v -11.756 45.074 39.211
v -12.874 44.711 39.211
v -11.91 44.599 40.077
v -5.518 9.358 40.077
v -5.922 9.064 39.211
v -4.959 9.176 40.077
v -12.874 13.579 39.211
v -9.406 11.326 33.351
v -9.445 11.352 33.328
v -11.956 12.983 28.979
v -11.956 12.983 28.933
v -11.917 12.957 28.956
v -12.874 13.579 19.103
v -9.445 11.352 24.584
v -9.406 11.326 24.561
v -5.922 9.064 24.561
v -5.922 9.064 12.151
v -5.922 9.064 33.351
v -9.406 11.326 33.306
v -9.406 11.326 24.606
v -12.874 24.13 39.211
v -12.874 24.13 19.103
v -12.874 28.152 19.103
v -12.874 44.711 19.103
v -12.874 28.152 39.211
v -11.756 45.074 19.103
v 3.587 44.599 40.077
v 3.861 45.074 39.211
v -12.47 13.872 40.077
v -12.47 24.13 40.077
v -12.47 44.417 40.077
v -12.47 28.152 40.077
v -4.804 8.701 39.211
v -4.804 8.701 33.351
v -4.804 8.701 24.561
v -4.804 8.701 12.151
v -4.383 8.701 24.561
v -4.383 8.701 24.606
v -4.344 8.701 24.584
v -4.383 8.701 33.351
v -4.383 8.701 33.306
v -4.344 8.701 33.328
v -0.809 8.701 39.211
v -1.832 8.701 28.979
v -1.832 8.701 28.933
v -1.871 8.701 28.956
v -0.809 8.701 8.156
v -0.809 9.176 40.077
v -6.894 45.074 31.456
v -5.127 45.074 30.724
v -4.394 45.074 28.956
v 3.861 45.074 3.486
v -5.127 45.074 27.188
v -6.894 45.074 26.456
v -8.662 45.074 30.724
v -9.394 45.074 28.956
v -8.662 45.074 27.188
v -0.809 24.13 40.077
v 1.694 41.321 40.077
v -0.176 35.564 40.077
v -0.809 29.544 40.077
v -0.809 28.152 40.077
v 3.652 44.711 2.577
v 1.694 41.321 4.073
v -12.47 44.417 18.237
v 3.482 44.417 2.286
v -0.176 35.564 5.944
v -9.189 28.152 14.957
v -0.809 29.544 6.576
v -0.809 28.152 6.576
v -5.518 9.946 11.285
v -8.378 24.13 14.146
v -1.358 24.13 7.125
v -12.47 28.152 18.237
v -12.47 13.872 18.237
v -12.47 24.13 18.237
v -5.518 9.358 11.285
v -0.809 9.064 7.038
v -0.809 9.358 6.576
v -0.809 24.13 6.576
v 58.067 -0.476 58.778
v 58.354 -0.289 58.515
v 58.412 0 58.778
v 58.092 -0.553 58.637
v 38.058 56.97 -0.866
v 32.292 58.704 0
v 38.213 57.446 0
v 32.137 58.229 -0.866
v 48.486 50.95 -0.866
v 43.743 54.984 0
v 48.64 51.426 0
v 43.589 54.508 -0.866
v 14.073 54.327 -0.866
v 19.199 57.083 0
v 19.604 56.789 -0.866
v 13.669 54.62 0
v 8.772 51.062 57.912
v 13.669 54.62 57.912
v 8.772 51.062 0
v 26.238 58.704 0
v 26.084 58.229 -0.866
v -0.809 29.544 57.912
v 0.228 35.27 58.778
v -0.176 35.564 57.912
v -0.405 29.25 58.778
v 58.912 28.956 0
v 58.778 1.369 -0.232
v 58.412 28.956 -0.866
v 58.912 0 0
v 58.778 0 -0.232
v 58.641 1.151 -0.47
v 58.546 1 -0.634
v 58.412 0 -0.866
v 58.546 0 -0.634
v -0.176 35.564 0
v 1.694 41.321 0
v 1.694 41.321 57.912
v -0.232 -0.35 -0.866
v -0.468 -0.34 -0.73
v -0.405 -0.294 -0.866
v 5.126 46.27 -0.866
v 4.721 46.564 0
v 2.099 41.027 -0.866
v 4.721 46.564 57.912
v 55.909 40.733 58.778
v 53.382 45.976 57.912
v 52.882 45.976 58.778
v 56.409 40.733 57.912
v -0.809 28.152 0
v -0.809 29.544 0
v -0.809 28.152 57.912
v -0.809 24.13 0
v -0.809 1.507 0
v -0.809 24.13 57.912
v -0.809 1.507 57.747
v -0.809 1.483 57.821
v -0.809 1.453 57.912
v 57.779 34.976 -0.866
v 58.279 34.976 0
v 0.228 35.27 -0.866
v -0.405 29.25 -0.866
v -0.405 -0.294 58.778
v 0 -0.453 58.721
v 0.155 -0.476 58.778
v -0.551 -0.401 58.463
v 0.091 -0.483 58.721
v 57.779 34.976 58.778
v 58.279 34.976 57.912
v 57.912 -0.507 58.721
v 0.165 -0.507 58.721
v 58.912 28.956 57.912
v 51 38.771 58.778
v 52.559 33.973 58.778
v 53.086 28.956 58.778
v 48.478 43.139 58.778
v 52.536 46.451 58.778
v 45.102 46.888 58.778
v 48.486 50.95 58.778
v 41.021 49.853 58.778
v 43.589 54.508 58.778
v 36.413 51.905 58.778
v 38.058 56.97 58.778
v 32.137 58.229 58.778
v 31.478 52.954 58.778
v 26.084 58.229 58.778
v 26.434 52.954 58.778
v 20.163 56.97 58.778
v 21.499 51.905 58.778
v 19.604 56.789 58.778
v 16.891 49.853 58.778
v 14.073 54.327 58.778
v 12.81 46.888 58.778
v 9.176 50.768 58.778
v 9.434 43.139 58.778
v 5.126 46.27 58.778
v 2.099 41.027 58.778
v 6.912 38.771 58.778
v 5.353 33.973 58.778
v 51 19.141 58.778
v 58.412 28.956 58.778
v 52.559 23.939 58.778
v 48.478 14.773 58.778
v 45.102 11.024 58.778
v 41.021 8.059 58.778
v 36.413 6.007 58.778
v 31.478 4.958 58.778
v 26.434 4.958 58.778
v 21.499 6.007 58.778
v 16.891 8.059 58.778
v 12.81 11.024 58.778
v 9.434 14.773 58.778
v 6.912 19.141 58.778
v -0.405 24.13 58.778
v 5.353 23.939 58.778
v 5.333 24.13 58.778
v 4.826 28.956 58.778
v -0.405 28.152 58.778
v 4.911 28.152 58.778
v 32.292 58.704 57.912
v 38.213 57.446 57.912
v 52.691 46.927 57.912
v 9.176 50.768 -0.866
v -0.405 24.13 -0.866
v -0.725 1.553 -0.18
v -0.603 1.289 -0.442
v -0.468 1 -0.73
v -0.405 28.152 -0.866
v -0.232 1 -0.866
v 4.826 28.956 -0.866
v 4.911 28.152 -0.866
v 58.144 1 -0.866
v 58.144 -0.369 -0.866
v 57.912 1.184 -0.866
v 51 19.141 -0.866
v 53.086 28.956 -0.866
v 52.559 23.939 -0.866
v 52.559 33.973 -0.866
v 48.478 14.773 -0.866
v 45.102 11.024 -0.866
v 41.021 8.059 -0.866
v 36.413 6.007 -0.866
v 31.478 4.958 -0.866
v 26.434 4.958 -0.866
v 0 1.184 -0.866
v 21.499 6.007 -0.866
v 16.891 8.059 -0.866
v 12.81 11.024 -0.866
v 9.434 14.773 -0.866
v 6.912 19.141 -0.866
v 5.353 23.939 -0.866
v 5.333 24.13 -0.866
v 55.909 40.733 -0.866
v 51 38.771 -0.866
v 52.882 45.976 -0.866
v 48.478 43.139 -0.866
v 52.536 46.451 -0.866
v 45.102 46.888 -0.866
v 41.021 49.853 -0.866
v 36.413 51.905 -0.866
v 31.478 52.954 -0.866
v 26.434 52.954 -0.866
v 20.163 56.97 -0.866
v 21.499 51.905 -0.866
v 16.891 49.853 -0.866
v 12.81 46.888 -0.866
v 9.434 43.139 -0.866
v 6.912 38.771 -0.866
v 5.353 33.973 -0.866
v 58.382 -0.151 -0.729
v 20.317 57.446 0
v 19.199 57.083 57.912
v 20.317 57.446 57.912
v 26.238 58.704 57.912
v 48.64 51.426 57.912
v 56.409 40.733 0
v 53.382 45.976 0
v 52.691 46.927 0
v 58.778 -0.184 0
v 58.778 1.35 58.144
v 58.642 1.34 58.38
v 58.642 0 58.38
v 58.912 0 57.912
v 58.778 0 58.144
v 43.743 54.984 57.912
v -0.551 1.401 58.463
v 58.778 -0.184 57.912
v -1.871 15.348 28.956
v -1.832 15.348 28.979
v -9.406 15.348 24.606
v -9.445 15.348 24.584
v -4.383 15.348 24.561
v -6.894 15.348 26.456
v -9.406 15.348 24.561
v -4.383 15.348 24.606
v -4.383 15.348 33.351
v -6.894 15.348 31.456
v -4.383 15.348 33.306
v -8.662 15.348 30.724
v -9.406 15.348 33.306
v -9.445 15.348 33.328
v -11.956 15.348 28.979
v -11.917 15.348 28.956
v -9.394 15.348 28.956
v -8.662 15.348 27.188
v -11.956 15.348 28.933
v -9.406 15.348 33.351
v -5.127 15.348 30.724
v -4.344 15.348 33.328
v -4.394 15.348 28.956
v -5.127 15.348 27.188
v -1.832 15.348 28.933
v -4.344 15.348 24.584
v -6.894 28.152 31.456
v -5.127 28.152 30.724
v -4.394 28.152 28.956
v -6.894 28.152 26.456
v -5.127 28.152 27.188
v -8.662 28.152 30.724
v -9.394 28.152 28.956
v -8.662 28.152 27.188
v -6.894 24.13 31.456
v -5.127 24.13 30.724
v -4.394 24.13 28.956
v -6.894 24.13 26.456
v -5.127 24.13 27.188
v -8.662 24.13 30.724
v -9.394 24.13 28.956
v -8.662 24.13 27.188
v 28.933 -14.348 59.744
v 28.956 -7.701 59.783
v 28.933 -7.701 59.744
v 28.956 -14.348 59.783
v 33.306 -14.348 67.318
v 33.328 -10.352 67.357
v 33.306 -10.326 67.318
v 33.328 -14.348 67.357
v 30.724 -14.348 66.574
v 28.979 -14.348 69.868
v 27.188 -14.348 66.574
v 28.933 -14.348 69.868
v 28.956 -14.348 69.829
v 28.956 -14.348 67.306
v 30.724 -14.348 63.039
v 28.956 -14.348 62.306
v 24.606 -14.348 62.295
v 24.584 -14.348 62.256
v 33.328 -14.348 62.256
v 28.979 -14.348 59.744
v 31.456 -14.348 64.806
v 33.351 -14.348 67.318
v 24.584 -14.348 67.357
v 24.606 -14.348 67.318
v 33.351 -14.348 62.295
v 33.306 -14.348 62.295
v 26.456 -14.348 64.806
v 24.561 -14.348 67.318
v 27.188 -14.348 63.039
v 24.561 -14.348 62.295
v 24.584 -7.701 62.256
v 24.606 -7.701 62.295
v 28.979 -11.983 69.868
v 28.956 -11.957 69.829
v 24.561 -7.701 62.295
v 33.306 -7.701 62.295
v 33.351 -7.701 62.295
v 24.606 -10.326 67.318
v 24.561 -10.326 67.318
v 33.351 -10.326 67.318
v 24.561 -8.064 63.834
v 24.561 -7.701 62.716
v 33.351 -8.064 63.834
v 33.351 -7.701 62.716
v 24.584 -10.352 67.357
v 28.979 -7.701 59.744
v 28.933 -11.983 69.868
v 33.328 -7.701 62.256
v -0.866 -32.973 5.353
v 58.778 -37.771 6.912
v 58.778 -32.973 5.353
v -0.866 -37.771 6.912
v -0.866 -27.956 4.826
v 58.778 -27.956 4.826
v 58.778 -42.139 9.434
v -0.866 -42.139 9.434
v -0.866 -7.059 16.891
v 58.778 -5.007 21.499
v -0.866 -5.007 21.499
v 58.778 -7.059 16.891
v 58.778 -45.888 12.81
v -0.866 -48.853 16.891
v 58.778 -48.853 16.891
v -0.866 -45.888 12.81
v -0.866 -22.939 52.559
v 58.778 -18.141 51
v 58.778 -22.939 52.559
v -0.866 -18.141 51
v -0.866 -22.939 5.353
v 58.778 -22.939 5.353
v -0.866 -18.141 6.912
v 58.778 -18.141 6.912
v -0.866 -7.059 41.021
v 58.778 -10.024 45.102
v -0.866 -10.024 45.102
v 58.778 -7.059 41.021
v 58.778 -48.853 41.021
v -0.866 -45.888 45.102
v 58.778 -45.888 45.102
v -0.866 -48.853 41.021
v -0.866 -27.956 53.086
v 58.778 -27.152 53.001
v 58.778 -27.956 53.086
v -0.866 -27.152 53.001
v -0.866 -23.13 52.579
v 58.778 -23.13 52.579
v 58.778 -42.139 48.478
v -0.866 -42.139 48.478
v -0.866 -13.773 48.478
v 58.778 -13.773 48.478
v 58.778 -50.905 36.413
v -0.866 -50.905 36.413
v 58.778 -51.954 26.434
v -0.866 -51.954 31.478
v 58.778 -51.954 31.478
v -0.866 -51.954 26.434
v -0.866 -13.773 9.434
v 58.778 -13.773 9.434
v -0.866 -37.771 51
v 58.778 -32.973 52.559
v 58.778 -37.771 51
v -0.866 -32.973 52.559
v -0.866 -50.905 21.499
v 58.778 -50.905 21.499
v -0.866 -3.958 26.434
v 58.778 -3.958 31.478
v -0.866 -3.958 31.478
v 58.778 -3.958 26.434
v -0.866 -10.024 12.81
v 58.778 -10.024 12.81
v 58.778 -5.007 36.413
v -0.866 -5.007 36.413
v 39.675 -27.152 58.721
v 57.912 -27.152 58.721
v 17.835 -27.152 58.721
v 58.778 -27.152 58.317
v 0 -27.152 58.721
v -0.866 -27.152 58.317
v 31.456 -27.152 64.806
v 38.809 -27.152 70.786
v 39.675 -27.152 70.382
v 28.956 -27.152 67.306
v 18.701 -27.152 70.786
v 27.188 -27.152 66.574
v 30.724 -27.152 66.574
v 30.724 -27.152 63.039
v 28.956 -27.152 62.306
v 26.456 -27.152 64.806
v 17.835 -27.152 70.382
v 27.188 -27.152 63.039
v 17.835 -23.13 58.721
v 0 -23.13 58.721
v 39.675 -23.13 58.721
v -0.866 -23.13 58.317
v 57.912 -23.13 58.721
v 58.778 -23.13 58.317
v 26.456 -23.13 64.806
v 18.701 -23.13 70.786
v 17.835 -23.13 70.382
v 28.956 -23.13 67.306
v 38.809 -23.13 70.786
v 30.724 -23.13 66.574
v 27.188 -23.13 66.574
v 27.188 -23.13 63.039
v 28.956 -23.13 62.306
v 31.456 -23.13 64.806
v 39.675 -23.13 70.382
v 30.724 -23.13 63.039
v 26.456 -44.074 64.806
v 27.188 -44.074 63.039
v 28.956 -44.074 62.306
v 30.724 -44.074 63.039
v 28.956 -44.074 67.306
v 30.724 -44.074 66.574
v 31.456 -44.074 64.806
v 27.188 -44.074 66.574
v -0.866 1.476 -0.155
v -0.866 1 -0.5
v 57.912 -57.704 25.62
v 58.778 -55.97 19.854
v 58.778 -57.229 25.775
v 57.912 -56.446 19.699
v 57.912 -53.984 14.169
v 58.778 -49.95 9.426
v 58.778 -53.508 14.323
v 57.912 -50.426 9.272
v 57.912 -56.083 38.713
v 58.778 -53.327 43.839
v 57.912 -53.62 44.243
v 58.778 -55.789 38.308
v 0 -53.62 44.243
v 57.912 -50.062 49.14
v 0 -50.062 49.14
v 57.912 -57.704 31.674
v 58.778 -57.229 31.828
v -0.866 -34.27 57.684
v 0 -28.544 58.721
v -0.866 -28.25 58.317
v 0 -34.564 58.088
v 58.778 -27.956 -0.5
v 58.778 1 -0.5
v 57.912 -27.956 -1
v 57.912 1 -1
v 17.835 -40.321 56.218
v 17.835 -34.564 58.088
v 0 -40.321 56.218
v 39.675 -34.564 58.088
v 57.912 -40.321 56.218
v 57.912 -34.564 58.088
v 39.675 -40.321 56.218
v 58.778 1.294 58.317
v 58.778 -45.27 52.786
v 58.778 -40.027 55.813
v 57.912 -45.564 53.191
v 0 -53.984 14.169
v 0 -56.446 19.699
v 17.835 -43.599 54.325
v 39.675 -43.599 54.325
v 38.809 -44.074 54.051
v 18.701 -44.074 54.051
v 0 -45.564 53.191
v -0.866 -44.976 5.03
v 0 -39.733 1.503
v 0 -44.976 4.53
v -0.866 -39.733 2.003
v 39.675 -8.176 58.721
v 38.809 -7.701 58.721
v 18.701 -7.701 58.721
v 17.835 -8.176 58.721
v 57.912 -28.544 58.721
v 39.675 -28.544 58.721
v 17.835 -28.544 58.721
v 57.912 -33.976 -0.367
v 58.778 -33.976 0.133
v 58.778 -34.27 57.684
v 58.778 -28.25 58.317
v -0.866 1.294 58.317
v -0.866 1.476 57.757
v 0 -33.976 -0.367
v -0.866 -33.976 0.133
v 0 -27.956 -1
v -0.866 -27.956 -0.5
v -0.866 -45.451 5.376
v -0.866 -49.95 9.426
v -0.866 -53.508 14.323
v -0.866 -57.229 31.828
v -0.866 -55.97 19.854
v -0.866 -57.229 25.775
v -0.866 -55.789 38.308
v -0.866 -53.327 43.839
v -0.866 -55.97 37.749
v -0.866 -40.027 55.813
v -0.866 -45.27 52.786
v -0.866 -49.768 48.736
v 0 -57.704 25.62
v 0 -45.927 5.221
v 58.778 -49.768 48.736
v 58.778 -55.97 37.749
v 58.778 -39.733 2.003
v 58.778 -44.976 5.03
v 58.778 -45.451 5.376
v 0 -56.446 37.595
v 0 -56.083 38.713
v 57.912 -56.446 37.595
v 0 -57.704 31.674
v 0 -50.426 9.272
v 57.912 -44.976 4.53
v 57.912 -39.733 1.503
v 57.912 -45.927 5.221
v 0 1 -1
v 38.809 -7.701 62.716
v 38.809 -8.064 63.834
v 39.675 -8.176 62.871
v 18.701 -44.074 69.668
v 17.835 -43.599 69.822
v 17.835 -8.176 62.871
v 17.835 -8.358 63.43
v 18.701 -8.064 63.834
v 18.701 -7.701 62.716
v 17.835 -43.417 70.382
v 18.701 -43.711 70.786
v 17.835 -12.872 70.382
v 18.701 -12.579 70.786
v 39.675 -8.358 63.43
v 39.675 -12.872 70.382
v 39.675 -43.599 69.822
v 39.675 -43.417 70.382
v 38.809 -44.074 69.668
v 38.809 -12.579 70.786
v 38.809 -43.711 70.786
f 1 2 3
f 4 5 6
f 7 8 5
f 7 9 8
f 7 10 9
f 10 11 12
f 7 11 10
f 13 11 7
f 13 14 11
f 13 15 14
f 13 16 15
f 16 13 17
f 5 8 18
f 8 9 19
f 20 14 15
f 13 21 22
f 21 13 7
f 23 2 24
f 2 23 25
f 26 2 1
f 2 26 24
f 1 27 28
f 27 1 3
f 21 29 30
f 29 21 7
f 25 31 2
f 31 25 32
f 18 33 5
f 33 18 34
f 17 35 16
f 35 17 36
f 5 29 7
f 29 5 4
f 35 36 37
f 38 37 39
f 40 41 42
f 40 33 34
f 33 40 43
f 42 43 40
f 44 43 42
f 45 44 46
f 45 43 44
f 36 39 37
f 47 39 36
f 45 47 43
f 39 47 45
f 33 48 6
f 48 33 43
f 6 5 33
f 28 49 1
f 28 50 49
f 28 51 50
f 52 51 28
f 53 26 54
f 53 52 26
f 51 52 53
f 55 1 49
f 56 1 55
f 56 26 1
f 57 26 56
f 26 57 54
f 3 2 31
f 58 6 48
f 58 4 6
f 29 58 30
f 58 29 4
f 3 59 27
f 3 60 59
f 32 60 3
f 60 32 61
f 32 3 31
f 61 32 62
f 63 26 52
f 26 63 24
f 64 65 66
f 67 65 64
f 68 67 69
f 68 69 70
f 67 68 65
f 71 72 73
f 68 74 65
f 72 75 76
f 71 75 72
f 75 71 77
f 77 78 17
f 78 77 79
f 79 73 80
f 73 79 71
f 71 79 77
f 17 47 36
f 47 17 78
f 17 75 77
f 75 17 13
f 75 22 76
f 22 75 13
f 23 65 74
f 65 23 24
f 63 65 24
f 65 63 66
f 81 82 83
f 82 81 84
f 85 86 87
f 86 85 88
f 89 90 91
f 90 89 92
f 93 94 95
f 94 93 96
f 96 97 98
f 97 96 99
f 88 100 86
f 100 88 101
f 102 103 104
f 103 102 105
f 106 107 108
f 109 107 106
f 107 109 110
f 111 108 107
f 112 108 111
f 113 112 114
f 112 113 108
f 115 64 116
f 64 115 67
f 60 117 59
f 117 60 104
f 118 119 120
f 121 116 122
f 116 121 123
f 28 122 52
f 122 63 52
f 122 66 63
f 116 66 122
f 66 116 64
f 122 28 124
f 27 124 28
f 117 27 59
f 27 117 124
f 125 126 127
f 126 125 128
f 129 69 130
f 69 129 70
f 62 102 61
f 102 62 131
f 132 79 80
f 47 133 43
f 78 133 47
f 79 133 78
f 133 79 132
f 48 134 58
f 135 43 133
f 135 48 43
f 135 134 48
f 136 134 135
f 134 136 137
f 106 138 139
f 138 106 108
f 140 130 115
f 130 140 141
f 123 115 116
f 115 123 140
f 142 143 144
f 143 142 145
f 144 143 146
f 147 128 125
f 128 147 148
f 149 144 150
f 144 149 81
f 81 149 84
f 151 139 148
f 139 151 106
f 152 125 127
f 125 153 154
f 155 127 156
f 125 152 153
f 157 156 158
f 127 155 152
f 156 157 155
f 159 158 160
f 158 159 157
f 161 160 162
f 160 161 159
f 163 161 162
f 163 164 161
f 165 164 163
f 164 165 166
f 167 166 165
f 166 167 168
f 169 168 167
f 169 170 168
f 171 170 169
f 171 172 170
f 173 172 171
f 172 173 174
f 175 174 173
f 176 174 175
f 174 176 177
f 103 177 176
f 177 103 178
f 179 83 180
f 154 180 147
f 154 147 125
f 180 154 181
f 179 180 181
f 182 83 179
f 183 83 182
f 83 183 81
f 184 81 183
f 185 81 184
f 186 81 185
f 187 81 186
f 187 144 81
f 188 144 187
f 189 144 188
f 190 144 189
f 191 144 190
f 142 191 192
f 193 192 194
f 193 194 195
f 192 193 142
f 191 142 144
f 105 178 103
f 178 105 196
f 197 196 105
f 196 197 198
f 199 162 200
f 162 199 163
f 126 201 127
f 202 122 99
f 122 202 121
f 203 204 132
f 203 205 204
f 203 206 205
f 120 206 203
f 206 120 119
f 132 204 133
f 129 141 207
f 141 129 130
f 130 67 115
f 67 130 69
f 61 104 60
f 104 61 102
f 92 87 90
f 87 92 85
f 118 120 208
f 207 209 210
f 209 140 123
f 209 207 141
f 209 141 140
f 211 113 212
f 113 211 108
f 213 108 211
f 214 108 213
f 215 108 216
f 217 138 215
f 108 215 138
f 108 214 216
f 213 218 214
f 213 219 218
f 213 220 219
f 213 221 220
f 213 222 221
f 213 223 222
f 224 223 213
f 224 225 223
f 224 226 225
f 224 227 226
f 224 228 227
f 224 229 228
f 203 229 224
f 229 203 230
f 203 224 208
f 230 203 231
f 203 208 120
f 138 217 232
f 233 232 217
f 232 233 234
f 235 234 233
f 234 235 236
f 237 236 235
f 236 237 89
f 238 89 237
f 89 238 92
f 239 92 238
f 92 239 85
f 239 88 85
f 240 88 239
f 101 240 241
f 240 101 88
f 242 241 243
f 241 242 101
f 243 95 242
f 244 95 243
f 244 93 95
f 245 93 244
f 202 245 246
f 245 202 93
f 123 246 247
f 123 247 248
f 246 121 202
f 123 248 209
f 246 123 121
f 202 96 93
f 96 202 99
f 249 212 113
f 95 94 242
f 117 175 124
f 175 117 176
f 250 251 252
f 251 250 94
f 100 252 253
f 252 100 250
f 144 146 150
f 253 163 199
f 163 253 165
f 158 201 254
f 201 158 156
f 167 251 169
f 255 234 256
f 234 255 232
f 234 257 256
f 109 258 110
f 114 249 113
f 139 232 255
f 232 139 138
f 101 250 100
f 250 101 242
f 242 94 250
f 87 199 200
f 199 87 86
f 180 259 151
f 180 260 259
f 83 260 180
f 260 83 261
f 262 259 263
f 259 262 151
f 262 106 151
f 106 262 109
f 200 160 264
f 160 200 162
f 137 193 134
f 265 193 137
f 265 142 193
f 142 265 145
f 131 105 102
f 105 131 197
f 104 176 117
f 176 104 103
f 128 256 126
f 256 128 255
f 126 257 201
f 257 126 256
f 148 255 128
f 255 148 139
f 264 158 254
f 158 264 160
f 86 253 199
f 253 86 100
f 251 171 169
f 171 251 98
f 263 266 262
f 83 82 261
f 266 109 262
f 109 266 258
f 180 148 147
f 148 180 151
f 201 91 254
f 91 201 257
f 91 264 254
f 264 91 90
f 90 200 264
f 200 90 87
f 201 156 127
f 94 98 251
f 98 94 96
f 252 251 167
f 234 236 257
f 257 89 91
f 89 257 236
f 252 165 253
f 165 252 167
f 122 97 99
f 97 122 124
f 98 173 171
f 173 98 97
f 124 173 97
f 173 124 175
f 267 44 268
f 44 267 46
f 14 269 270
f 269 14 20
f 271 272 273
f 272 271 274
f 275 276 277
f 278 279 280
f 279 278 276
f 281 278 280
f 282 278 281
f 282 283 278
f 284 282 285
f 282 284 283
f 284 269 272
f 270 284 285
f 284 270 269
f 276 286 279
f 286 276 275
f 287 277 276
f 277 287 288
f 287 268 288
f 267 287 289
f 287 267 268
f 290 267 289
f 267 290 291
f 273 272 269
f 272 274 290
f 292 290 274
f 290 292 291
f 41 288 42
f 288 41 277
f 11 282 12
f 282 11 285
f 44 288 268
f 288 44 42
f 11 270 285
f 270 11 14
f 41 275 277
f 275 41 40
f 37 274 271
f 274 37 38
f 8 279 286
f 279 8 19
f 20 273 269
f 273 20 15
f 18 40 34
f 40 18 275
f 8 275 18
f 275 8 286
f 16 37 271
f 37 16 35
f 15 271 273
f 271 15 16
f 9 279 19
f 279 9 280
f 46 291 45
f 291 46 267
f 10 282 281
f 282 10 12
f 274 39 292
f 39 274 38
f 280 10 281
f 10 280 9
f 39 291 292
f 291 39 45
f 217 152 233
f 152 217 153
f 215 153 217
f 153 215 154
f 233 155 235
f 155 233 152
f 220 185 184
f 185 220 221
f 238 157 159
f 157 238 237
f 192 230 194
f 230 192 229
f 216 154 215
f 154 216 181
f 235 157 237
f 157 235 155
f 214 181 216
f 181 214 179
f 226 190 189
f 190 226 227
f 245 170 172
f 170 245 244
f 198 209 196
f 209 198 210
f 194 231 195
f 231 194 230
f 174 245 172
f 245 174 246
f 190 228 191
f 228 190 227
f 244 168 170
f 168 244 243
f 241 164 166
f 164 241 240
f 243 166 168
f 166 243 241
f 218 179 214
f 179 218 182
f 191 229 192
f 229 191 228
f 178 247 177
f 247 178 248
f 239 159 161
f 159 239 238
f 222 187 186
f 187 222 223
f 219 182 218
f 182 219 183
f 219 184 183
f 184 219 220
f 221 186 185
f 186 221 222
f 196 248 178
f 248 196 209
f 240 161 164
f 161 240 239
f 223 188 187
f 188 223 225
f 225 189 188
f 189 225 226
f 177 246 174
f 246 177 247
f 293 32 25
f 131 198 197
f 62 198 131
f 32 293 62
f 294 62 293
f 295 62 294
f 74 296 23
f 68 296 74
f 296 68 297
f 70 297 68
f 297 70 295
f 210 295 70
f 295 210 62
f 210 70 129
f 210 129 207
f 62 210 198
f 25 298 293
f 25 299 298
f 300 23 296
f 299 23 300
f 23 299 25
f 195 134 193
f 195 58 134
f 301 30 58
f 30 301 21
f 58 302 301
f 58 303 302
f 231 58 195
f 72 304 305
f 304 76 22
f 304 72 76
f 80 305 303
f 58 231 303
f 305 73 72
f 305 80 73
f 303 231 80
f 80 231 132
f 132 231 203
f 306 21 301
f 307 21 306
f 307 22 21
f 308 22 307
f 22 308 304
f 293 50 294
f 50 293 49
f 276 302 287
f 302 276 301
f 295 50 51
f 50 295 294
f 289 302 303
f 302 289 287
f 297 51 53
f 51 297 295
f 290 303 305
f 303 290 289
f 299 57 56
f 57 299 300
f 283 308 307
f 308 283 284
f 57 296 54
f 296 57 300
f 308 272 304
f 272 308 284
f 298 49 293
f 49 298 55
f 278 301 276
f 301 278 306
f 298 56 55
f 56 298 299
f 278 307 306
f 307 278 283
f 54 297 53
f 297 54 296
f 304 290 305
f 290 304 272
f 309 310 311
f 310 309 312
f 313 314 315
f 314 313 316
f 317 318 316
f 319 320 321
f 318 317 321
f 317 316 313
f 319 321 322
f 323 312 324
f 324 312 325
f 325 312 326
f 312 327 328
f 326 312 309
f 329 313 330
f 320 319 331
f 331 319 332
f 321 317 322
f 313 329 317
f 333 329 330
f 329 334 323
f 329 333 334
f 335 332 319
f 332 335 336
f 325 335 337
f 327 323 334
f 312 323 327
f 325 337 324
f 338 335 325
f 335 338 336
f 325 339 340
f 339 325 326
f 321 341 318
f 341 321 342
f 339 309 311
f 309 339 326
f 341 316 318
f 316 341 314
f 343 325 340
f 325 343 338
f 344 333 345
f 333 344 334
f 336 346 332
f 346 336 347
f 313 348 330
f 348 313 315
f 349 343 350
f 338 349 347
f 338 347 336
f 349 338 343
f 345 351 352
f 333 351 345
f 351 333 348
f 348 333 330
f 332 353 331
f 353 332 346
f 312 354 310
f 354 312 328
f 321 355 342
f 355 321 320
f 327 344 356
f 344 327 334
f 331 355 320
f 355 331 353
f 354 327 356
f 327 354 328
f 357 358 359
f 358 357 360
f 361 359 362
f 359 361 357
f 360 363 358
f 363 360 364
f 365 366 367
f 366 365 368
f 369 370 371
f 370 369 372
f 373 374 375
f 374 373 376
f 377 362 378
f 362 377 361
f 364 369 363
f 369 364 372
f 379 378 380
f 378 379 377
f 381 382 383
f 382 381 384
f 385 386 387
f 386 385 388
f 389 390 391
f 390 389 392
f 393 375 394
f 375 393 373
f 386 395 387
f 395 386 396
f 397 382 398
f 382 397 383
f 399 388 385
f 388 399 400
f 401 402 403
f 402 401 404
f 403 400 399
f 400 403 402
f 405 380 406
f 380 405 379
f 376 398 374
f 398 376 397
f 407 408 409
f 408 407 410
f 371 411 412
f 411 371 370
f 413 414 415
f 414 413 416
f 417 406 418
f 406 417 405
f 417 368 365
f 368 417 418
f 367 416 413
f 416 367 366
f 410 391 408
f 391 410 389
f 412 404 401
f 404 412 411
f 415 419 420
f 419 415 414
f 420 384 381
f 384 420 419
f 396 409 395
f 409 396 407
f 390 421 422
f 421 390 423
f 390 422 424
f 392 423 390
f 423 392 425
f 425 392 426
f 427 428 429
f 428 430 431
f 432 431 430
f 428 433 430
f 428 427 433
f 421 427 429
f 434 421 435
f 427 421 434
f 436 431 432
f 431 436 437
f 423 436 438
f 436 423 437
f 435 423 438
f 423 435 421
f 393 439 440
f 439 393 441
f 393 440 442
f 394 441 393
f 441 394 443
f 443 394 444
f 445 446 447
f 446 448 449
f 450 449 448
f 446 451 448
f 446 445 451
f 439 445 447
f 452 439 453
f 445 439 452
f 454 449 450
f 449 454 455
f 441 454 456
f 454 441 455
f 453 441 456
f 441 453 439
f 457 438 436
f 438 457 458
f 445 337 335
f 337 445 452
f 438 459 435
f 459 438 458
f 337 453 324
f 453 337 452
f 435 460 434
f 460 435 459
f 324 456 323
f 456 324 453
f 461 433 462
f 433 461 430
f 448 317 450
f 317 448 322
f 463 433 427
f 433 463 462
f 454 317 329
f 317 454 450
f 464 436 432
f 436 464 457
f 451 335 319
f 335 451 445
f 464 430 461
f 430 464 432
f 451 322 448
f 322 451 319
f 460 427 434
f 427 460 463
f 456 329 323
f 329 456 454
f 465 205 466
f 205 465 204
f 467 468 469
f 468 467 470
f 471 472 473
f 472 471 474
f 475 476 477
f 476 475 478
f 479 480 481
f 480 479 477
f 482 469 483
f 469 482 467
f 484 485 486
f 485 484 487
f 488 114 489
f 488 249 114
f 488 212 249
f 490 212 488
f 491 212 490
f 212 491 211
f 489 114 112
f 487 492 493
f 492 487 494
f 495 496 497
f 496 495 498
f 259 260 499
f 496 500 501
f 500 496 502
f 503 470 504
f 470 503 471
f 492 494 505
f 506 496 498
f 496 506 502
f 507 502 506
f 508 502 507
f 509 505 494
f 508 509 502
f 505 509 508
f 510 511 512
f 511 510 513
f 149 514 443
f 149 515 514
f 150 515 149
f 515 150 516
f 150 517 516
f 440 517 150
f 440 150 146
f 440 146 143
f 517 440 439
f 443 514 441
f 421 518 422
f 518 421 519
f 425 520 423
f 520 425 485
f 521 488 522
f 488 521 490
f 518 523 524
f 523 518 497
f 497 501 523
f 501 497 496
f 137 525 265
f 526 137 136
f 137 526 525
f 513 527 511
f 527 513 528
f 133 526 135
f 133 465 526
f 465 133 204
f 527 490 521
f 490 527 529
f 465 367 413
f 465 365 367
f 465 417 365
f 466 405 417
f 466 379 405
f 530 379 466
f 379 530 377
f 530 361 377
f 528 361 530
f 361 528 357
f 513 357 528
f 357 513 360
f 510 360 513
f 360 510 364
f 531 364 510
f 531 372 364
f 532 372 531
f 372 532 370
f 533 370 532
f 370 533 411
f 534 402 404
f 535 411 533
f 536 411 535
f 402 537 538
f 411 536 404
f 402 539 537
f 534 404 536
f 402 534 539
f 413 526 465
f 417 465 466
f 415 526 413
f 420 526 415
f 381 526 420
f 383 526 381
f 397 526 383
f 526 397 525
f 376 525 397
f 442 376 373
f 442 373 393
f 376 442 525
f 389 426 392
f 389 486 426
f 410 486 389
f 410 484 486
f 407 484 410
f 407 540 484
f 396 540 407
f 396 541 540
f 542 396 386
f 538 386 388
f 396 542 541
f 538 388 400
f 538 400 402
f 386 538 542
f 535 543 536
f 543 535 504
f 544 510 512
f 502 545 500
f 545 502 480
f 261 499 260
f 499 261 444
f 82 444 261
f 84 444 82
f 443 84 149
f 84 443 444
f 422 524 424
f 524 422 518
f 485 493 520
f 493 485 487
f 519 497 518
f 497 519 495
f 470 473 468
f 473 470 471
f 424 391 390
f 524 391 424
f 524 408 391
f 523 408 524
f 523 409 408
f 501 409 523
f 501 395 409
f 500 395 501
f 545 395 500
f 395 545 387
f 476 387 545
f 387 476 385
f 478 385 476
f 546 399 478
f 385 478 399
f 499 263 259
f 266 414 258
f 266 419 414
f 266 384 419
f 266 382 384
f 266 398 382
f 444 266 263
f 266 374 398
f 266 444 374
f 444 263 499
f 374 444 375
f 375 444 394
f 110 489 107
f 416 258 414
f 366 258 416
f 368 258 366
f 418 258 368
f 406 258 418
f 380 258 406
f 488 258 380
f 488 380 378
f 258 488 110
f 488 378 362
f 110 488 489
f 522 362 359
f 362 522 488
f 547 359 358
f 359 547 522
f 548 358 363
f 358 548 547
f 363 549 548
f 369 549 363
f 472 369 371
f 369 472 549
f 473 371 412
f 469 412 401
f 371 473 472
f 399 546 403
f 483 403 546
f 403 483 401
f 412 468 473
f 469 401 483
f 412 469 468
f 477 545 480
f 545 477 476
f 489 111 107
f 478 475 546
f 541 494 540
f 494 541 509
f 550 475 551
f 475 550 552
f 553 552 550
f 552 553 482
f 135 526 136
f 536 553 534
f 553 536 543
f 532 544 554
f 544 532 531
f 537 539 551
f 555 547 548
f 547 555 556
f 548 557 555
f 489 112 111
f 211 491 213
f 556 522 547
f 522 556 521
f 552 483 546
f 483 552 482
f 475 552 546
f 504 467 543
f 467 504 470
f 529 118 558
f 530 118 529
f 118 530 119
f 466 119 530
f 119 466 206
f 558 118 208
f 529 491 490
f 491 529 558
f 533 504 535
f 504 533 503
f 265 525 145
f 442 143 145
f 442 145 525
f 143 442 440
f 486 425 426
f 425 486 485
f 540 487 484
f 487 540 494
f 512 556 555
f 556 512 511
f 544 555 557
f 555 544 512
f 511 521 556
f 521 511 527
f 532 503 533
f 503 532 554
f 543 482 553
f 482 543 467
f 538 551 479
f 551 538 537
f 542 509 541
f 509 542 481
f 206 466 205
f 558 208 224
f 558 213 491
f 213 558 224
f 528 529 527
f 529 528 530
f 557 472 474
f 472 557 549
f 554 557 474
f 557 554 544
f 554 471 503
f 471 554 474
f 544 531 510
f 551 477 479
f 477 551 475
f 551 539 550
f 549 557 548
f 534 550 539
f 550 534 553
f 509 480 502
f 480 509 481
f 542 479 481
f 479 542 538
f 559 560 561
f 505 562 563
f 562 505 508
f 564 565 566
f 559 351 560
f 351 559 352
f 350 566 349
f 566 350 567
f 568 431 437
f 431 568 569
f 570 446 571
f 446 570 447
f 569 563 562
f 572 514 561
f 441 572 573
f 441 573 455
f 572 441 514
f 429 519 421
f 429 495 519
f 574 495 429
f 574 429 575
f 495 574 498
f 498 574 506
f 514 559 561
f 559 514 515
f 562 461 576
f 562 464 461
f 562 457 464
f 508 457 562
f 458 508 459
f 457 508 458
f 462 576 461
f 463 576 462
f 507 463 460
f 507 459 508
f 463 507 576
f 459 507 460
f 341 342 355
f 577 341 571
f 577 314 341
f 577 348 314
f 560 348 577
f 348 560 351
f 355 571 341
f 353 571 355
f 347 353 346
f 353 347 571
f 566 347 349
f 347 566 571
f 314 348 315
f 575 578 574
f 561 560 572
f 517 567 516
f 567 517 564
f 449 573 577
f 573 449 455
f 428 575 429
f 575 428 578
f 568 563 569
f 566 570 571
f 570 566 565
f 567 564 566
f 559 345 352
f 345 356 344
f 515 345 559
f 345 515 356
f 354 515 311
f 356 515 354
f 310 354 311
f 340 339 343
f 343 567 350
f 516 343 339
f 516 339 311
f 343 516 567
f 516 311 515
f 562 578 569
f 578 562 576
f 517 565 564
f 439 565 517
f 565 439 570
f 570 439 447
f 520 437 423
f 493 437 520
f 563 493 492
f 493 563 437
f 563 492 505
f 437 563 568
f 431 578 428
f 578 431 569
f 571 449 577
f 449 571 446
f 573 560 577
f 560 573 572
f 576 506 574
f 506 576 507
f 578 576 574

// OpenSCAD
//M. Haris Usmani
//http://harisusmani.com

//All Units are in mm, Import as STL with Unit=mm
//$fn=100;

/* [Main Settings] */
//Radius of Pipe in Inches (Schedule 40)
R=1.9; //[2.375:2"PVC,1.9:1-1/2"PVC,1.660:1-1/4"PVC,1.315:1"PVC]

//Space for Tightening
T=3; //[0:5]

//Nut Size
M=5; //[4,5,6]

/////////////////////////////////////////////////////////////////////////////
R_mm=R*25.4; //Converted to mm!
//Strength of Clamp (Fixed)
S=1.2; // [1.2] Determines Strength of Clamp in Percentage-FIXED!

/////////////////////////////////////////////////////////////////////////////
//Hexagonal Module from shapes.scad, http://svn.clifford.at/openscad/trunk/libraries/shapes.scad by Catarina Mota
module hexagon(size, height) {
  boxWidth = size/1.75;
  for (r = [-60, 0, 60]) rotate([0,0,r]) cube([boxWidth, size, height], true);
}
/////////////////////////////////////////////////////////////////////////////

//Pipe Model for Visualization
//translate([R_mm*S/2,R_mm*S/2,-R_mm*6]) cylinder(R_mm*10,R_mm/2,R_mm/2);

union()//Main Duplication
{

difference() //Pipe Hole
{
union()
{
minkowski() //Fillet
{
	union()
	{
		cube([R_mm*S,R_mm/2*S, R_mm*S]); //Main Body
		translate([R_mm*S/2,R_mm*S/2,0]) cylinder(R_mm*S,R_mm*S/2,R_mm*S/2); //Curved Edge
	}
	sphere([R_mm/2,R_mm,R_mm*5/12]); //Fillet Object
}

minkowski() //Fillet
{
	difference() //Hard Chamfer
	{
        union(){
		translate([-R_mm/4,R_mm/5,(R_mm/2)-(R_mm*5/48)]) cube([R_mm/2,R_mm/1.4,R_mm*5/12]);

		translate([-R_mm/4,R_mm/5,(R_mm/2)-(R_mm*5/48)]) 
            rotate([0,45,0])
            cube([R_mm/2,R_mm/1.4,R_mm*5/12]);
        }
        
		translate([-R_mm,-R_mm*7/17,(R_mm/2)-(R_mm*6/24)]) 
        rotate([0,0,-33]) cube([R_mm/2,R_mm,2*R_mm*5/12]);
	}
    
	sphere([R_mm/2,R_mm,R_mm*5/12]); //Fillet Object
}
}
	union()
	{
		translate([R_mm*S/2,R_mm*S/2,-R_mm*6]) cylinder(R_mm*10,R_mm/2,R_mm/2);//Pipe
		translate([-R_mm,R_mm*S*5/12,-R_mm]) cube([R_mm*2,R_mm/(15-T),R_mm*4]);//Tightning Space
		translate([-R_mm/7,R_mm*2,(R_mm*S/2)]) rotate([90,0,0]) cylinder((R_mm*4),M/2,M/2); //Screw Space
		if (M==4) translate([-R_mm/7,-R_mm*0.2,(R_mm*S/2)]) rotate([90,0,0]) hexagon(7.66,50); //NUTS
		if (M==5) translate([-R_mm/7,-R_mm*0.2,(R_mm*S/2)]) rotate([90,0,0]) hexagon(8.79,50);
		if (M==6) translate([-R_mm/7,-R_mm*0.2,(R_mm*S/2)]) rotate([90,0,0]) hexagon(11.05,50);
	}
} //Single Side ENDS

}

{

translate([R_mm*S,1,R_mm*S]) rotate([180,90,0]) //Main Translation

//COPY SIDE HERE
difference() //Pipe Hole
{
union()
{
minkowski() //Fillet
{
	union()
	{
		cube([R_mm*S,R_mm/2*S, R_mm*S]); //Main Body
		translate([R_mm*S/2,R_mm*S/2,0]) cylinder(R_mm*S,R_mm*S/2,R_mm*S/2); //Curved Edge
	}
	sphere([R_mm/2,R_mm,R_mm*5/12]); //Fillet Object
}

minkowski() //Fillet
{
	difference() //Hard Chamfer
	{
		translate([-R_mm/4,R_mm/5,(R_mm/2)-(R_mm*5/48)]) cube([R_mm/2,R_mm/1.4,R_mm*5/12]);
		translate([-R_mm,-R_mm*7/17,(R_mm/2)-(R_mm*5/24)]) rotate([0,0,-33]) cube([R_mm/2,R_mm,2*R_mm*5/12]);
	}
	sphere([R_mm/2,R_mm,R_mm*5/12]); //Fillet Object
}
}
	union()
	{
		translate([R_mm*S/2,R_mm*S/2,-R_mm*6]) cylinder(R_mm*10,R_mm/2,R_mm/2);//Pipe
		translate([-R_mm,R_mm*S*5/12,-R_mm]) cube([R_mm*2,R_mm/(15-T),R_mm*4]);//Tightning Space
		translate([-R_mm/7,R_mm*2,(R_mm*S/2)]) rotate([90,0,0]) cylinder((R_mm*4),M/2,M/2); //Screw Space
		if (M==4) translate([-R_mm/7,-R_mm*0.2,(R_mm*S/2)]) rotate([90,0,0]) hexagon(7.66,50); //NUTS
		if (M==5) translate([-R_mm/7,-R_mm*0.2,(R_mm*S/2)]) rotate([90,0,0]) hexagon(8.79,50);
		if (M==6) translate([-R_mm/7,-R_mm*0.2,(R_mm*S/2)]) rotate([90,0,0]) hexagon(11.05,50);
	}
}
///////////////
}
